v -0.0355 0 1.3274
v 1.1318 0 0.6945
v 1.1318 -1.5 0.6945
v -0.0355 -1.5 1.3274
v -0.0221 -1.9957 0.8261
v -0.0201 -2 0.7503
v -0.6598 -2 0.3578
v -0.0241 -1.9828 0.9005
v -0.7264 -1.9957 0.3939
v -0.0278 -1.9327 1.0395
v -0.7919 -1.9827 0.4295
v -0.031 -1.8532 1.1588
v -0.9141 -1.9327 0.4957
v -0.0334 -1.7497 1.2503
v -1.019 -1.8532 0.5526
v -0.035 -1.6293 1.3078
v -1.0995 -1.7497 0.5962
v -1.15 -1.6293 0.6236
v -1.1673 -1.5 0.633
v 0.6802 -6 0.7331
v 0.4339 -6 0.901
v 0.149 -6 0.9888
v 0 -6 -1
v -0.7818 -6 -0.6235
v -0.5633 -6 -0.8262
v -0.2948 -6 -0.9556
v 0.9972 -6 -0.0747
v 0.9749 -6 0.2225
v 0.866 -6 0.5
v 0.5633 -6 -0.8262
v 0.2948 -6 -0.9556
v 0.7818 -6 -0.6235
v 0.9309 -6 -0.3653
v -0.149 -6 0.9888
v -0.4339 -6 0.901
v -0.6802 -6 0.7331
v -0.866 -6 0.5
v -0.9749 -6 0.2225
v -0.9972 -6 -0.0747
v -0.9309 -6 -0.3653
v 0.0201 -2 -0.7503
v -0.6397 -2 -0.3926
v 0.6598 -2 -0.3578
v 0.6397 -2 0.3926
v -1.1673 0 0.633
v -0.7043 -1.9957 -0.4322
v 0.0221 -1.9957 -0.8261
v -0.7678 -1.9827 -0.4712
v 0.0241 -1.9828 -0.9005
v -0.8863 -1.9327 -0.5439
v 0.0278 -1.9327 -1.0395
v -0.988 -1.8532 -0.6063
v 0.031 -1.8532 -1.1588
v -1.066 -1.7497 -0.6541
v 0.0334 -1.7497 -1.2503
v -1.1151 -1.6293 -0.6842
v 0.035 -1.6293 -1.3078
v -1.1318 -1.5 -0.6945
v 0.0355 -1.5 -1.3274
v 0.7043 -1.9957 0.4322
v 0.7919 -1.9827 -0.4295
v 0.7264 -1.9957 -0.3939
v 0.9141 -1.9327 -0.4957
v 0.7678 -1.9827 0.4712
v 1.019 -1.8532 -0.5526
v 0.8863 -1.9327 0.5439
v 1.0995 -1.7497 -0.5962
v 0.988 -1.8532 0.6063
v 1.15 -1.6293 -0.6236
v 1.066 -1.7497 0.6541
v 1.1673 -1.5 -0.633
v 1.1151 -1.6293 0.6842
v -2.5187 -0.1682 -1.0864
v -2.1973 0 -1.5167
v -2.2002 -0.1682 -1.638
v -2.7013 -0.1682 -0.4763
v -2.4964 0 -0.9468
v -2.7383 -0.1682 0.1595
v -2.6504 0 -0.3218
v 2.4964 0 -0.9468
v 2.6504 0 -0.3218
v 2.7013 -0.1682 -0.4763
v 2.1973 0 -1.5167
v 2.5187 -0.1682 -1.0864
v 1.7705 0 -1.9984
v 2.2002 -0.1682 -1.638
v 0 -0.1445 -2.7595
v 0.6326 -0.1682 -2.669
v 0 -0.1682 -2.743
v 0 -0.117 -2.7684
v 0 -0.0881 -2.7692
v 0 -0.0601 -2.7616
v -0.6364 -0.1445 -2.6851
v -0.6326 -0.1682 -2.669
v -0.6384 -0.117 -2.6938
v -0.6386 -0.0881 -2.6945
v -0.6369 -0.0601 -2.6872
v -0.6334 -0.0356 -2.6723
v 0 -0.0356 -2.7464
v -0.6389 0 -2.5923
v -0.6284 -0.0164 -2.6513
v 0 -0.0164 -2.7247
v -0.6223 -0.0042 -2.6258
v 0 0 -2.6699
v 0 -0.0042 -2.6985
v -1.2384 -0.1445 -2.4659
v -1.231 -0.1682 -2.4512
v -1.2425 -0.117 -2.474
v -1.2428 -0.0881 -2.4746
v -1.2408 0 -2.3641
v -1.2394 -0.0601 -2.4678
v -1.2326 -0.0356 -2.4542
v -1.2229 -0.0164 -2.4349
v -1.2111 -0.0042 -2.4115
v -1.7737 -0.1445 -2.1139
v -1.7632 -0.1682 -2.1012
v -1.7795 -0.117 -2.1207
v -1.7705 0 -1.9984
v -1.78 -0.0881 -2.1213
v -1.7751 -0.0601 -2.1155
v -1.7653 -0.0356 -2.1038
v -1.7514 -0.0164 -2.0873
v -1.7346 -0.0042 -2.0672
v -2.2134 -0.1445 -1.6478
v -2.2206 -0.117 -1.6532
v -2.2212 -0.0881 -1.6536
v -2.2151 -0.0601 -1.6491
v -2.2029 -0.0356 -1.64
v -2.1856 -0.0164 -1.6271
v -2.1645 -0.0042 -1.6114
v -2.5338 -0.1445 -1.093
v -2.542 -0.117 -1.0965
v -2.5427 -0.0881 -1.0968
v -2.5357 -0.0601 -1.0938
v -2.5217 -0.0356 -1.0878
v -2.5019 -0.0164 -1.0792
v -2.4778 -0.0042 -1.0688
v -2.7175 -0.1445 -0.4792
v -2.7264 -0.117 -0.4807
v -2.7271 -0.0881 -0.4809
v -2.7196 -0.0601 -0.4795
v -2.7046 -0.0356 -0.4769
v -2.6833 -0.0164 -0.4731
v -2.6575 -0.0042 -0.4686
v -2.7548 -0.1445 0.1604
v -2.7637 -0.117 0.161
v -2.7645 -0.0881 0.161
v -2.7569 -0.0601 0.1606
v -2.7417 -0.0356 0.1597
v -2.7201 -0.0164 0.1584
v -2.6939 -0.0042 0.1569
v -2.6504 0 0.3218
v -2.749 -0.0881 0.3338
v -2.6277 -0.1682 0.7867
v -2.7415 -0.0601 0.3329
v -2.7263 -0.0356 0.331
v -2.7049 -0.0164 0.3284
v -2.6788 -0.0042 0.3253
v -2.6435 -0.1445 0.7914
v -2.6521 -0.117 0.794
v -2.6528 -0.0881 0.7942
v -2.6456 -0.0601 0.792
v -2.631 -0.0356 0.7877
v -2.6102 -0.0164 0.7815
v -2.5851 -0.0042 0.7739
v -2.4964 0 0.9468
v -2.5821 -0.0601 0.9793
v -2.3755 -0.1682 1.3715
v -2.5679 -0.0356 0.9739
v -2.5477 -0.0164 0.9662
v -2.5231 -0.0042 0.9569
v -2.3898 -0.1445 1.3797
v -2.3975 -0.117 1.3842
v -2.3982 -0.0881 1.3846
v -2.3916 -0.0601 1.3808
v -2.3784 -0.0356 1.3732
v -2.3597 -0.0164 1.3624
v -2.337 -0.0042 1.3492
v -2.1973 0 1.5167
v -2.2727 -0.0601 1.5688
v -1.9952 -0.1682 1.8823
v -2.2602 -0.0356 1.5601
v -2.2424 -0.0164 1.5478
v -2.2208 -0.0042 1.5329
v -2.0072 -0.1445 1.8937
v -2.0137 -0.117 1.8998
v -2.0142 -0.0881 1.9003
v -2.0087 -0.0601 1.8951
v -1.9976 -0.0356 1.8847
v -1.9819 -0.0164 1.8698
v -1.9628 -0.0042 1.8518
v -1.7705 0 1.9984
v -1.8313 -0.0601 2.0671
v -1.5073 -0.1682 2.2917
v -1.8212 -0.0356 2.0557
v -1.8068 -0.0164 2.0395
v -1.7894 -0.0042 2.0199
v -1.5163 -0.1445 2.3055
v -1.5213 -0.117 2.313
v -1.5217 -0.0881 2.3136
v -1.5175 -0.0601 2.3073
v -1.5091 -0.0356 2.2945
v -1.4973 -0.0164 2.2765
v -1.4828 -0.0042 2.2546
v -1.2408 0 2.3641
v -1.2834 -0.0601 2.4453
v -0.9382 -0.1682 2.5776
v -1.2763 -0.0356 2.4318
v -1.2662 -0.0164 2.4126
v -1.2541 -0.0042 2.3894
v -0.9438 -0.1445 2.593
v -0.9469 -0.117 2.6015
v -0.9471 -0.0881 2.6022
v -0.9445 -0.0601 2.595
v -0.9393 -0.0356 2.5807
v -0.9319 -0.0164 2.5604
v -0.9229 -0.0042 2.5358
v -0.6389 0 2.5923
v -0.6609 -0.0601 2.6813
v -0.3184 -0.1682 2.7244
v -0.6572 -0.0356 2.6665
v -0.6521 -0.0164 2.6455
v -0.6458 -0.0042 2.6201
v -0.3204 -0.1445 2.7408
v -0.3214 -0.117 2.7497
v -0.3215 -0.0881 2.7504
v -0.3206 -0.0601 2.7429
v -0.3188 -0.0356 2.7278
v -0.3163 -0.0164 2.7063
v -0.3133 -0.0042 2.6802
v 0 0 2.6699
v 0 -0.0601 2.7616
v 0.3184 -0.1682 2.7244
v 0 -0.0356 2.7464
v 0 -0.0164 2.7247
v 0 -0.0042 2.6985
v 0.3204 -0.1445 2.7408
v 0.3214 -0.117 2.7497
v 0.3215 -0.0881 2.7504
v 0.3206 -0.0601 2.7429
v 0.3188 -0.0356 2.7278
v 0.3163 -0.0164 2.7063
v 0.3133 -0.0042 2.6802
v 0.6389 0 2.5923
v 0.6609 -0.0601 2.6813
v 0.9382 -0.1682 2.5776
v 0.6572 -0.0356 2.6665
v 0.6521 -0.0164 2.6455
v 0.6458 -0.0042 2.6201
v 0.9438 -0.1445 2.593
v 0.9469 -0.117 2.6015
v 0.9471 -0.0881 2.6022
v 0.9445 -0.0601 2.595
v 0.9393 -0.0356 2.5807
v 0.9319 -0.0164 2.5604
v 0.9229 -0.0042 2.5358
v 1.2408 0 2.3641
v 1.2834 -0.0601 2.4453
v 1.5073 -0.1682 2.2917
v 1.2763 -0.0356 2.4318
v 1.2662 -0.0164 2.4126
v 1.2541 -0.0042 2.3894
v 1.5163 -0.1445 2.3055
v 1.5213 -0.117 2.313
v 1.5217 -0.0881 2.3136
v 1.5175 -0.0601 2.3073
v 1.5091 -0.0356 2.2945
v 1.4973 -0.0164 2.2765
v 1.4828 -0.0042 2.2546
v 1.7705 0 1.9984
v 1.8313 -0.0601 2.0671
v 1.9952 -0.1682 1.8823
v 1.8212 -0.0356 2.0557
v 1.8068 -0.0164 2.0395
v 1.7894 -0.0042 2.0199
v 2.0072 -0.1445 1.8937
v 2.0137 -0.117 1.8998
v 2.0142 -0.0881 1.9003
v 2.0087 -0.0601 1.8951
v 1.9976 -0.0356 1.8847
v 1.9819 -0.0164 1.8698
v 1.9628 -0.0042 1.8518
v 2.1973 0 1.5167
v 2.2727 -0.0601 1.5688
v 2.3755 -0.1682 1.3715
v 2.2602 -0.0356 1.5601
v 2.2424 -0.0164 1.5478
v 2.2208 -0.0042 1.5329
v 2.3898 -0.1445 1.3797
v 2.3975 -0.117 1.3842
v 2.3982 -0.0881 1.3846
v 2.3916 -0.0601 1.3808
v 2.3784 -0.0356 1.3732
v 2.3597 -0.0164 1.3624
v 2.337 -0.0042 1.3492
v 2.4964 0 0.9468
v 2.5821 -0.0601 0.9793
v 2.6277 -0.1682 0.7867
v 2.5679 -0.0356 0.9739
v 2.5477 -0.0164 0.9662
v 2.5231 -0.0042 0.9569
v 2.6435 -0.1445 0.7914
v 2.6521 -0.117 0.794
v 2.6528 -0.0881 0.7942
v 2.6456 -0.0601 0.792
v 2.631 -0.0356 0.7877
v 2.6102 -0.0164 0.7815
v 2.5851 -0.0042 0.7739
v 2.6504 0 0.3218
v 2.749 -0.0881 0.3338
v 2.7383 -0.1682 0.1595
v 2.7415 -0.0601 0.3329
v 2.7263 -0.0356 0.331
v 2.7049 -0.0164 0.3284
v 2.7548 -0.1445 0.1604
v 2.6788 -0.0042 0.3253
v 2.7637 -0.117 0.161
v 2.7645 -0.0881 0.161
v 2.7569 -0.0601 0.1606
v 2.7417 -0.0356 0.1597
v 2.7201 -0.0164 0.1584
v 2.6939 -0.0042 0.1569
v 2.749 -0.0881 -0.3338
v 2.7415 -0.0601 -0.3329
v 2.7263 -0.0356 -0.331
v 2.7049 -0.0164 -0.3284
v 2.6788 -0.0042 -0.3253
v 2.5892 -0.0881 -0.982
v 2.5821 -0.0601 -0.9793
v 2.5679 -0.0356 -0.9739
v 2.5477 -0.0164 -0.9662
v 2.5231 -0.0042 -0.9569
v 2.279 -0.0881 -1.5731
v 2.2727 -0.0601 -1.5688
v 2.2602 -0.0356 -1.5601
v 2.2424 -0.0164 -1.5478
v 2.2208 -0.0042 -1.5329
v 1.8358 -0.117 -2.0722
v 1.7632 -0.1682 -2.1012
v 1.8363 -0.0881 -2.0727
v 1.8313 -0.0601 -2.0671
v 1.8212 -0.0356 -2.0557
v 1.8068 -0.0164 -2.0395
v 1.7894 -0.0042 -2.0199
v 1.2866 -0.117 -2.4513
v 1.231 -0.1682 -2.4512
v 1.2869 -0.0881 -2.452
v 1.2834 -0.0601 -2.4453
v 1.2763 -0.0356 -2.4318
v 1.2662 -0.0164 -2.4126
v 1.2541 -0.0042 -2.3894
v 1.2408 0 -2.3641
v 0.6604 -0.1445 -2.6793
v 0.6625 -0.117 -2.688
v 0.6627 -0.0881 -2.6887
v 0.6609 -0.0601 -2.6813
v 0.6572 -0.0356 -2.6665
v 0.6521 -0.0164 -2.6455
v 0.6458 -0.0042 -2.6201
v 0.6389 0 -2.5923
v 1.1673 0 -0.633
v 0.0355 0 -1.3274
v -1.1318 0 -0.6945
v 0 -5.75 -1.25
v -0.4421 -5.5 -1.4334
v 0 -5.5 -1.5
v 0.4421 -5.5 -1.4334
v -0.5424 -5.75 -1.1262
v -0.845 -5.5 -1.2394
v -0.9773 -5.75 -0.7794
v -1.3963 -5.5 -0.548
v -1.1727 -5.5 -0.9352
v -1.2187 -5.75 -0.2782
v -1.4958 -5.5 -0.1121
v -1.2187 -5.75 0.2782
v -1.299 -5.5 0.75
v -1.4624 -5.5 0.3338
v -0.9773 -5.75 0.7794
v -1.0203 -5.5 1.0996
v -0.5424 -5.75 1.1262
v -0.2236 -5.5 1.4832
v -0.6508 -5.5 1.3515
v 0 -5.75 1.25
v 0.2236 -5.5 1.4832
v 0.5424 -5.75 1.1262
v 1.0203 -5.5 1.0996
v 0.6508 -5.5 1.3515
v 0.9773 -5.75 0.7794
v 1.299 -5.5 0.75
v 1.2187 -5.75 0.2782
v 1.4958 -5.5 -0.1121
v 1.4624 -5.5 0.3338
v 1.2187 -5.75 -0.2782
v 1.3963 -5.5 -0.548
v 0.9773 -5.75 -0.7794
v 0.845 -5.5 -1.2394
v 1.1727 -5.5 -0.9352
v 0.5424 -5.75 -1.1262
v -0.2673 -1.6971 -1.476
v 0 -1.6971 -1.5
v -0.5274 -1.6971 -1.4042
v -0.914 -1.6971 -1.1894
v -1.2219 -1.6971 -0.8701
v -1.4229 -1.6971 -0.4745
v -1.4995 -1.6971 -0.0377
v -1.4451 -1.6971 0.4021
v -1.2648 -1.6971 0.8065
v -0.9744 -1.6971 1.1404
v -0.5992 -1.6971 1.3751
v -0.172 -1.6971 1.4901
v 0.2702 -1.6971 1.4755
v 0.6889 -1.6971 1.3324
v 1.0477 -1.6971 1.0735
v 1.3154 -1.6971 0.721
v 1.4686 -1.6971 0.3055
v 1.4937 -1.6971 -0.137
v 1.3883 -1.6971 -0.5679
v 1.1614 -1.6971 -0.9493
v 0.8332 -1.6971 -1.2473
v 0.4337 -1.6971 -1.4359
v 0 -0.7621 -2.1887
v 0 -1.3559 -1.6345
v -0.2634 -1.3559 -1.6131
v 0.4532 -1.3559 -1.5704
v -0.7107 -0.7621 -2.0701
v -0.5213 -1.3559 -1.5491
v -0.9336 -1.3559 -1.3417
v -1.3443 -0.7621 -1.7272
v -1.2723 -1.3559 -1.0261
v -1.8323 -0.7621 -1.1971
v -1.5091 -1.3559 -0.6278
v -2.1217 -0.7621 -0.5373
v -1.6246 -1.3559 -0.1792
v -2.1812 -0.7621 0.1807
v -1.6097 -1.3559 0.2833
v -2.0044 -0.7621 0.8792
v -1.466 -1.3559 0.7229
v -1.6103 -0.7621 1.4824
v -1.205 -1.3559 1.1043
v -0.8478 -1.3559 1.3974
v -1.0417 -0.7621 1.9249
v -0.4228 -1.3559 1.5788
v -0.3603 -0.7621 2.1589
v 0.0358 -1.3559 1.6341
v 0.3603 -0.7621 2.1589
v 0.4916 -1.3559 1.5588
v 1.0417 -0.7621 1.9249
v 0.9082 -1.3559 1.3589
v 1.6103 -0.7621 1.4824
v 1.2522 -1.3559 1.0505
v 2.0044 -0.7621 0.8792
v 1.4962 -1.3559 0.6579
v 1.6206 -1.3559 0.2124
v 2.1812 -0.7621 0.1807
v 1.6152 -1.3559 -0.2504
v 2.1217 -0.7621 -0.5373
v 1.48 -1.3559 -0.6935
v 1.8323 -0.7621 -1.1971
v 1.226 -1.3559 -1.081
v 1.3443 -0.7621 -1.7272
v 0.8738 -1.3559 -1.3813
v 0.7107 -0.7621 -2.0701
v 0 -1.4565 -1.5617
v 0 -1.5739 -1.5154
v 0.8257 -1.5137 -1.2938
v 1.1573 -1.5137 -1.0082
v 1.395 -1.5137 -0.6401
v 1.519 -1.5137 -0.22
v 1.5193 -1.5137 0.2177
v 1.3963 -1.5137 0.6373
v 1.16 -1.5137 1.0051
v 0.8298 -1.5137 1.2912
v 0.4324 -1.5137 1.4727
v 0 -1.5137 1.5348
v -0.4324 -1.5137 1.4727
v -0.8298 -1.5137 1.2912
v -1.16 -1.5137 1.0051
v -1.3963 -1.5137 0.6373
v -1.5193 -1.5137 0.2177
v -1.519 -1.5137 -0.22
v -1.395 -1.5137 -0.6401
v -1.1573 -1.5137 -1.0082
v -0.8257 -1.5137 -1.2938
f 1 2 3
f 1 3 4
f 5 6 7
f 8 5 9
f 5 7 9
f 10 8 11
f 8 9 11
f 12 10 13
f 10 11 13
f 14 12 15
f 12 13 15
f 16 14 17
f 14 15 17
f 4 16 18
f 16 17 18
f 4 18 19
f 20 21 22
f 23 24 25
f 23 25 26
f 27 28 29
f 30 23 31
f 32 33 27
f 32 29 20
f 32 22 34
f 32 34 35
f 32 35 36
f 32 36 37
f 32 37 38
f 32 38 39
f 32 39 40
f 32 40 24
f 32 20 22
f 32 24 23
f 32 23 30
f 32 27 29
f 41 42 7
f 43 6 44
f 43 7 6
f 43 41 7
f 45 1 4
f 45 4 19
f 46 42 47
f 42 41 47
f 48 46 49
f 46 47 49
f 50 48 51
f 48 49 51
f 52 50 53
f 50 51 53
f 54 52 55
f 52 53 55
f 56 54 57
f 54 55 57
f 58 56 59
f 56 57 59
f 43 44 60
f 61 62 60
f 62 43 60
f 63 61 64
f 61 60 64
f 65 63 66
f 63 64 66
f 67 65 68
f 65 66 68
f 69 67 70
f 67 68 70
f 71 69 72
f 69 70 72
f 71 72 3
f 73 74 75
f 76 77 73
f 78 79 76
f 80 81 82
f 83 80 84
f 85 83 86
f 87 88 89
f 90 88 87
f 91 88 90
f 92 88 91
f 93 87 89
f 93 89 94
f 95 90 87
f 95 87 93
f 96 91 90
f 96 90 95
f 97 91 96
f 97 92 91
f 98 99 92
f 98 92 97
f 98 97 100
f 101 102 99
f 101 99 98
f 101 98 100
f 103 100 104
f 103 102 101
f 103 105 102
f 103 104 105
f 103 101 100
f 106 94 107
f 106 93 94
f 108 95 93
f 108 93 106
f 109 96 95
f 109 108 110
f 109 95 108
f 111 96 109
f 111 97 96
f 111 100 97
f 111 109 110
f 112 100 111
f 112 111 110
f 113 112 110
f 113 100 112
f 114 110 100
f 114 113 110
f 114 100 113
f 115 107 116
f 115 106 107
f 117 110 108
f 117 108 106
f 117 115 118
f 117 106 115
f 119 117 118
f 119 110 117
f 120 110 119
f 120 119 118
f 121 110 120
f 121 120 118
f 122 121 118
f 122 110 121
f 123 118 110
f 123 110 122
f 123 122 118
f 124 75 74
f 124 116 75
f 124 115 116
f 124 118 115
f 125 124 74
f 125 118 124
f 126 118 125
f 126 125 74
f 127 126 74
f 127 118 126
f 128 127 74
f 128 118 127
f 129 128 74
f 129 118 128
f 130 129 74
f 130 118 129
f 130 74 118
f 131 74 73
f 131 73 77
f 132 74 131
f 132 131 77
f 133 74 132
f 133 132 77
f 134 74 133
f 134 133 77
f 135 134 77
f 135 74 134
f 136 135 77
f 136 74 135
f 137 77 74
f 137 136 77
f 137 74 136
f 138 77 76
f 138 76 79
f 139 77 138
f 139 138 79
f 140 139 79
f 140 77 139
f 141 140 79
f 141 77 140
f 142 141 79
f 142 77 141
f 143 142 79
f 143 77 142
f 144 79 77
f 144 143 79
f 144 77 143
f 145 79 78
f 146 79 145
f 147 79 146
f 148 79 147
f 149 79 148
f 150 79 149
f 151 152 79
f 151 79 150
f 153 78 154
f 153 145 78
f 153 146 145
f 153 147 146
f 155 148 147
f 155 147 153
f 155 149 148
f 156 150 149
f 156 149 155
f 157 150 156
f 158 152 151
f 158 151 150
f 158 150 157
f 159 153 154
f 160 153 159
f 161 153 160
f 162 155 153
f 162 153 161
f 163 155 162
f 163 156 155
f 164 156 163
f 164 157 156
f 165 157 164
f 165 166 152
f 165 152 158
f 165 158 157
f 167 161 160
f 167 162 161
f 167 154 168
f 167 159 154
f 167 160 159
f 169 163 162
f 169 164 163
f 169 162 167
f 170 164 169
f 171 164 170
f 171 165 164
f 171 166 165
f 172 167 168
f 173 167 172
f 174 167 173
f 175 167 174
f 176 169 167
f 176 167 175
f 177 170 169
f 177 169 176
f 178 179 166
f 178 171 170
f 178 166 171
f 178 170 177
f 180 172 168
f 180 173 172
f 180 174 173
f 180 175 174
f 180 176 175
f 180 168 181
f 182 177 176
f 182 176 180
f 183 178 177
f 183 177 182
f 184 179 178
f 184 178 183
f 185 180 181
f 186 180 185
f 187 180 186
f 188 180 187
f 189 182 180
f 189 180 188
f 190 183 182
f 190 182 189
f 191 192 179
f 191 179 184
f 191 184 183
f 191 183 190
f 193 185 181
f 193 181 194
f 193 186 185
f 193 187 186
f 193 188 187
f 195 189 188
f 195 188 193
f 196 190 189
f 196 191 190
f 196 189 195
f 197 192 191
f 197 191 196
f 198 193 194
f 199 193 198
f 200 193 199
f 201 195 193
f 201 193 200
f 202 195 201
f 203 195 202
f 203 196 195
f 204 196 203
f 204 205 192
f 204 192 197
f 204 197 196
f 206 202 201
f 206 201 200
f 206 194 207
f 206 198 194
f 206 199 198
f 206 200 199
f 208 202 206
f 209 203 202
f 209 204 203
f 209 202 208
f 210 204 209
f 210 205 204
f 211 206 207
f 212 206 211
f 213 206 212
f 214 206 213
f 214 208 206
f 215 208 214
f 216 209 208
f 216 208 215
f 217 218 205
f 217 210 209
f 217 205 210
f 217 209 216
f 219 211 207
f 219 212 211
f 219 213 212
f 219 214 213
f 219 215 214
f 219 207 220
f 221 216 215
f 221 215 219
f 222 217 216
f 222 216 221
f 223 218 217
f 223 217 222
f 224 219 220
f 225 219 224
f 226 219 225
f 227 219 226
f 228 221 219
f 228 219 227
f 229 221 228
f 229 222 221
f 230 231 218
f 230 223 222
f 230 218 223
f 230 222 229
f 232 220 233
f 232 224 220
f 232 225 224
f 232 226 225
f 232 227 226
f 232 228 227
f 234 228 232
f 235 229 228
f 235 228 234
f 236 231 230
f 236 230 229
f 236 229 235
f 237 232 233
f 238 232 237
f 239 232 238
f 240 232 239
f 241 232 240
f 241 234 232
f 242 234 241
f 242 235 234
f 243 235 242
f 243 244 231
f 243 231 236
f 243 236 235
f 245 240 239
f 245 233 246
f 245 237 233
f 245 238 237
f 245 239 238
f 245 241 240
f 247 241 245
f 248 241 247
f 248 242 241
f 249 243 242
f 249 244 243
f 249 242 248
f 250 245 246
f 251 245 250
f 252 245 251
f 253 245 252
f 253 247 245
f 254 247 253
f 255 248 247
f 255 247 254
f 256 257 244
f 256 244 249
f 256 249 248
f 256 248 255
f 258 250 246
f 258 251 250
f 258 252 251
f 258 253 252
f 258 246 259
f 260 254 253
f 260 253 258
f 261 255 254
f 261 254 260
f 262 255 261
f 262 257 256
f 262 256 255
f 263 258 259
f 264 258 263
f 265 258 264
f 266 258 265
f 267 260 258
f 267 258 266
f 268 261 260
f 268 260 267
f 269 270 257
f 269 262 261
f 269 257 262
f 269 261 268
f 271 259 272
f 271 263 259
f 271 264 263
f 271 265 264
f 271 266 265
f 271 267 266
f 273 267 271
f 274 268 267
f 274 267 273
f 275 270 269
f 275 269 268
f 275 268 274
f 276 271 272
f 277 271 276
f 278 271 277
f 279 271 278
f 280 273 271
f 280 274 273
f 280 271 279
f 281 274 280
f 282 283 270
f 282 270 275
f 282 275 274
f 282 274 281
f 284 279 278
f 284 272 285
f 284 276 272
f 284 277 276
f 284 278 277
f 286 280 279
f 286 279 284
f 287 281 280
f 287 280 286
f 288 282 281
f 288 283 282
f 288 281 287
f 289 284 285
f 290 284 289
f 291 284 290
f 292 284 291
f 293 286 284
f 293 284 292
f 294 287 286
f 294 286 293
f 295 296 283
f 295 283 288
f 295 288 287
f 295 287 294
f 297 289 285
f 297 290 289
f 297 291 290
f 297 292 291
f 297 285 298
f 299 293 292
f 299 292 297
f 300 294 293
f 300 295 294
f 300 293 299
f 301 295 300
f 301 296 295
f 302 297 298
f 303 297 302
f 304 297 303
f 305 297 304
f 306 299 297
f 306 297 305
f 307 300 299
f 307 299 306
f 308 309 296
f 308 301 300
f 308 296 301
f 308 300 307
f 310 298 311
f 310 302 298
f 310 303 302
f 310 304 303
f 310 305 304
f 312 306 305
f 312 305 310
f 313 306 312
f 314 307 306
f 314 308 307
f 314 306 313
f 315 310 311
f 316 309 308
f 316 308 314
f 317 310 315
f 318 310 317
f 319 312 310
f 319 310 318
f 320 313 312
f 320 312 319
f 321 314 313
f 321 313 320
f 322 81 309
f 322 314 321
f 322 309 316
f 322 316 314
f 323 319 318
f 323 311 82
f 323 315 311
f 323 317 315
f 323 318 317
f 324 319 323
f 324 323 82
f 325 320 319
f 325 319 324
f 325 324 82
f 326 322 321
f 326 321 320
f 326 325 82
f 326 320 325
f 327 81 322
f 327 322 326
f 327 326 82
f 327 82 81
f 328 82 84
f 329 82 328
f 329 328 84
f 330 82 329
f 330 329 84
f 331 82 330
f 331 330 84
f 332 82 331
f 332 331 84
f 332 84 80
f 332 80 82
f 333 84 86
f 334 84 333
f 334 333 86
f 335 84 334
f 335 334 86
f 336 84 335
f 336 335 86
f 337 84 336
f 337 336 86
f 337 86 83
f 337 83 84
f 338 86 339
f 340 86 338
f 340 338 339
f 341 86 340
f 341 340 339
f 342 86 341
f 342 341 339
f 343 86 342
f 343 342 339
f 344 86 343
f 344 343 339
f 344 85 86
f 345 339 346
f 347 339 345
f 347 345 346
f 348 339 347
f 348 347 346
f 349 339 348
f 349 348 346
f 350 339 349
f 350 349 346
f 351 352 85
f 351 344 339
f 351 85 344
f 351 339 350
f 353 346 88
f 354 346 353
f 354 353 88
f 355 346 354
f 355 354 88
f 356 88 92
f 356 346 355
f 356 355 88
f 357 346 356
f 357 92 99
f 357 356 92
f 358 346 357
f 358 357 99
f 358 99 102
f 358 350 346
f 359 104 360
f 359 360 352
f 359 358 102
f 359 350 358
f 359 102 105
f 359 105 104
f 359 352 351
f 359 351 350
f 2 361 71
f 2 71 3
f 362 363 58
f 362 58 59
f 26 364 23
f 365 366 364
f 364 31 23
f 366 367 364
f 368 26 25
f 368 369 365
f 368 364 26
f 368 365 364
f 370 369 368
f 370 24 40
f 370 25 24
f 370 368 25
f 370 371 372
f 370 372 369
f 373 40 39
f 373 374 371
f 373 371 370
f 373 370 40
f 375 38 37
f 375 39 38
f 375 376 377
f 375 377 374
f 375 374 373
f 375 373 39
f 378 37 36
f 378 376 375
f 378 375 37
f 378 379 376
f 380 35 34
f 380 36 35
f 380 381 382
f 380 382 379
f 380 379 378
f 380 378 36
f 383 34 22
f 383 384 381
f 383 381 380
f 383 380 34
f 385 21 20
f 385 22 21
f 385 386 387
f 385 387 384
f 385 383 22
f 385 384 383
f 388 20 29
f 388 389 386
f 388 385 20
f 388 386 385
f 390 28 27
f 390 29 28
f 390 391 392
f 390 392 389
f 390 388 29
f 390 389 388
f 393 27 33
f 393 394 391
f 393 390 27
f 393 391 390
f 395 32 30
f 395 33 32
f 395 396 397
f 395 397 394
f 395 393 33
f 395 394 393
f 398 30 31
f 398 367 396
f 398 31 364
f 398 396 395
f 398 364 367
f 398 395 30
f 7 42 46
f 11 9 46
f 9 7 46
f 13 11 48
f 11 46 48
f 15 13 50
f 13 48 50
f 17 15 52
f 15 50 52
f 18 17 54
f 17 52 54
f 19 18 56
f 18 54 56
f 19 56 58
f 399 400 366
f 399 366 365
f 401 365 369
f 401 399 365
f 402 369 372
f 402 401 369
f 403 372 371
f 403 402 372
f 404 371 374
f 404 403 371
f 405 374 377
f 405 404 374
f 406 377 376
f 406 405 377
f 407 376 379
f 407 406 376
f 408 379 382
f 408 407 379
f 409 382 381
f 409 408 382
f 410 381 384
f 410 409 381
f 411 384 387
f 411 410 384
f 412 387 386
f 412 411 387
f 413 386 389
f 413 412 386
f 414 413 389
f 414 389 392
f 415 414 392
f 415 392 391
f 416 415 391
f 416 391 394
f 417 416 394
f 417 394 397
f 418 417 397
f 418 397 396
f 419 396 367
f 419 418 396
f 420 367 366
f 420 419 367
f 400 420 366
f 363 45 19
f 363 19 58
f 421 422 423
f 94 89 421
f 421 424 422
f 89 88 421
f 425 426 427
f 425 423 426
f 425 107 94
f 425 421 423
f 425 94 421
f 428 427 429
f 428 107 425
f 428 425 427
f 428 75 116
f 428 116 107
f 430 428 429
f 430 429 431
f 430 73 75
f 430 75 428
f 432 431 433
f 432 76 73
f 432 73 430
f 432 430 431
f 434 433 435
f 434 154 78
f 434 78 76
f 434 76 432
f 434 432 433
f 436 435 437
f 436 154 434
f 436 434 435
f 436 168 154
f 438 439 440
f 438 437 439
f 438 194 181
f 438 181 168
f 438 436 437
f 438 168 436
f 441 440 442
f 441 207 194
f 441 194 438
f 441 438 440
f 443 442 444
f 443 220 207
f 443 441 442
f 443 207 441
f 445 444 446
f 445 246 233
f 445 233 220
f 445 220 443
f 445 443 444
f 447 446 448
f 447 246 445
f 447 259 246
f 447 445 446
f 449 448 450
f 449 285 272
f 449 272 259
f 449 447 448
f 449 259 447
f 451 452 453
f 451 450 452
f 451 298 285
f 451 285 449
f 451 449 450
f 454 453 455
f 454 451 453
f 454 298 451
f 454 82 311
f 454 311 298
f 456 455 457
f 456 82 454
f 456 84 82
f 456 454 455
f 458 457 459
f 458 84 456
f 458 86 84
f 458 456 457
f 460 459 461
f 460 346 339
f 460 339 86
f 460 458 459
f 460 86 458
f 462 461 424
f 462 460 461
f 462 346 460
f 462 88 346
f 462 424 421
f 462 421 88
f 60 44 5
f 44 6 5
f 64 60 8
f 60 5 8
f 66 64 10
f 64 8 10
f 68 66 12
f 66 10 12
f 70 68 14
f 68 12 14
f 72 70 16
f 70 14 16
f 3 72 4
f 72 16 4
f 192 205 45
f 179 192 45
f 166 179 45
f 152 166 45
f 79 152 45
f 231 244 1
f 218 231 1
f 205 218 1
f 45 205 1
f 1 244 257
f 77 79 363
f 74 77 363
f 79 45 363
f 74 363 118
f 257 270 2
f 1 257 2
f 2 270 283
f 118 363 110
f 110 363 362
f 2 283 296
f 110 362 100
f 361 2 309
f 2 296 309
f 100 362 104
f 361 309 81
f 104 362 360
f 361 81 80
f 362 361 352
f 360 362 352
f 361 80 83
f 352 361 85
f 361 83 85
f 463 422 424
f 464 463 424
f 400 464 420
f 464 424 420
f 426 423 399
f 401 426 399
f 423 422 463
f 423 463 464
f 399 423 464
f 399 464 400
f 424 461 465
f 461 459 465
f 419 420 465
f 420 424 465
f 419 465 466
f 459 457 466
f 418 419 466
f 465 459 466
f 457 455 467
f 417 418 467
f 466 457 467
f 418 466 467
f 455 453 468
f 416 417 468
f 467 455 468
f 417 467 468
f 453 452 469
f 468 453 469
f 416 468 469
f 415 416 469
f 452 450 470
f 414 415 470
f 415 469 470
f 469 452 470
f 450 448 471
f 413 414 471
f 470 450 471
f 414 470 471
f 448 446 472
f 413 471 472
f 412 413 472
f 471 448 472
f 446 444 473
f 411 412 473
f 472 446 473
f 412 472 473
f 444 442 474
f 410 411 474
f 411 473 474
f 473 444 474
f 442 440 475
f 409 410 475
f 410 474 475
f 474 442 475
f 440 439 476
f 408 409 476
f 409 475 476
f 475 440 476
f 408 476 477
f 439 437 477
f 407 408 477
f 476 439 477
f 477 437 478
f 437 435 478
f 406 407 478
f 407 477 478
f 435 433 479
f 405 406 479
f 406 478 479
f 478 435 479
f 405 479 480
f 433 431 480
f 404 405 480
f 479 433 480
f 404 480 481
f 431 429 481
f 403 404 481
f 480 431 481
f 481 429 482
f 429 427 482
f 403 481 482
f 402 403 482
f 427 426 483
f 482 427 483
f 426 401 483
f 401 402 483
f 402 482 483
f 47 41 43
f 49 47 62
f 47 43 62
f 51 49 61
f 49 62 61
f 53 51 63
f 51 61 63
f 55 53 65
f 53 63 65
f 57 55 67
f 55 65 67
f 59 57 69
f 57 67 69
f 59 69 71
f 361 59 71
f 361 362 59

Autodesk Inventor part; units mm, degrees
ref_plane "YZ Plane" through (0, 0, 0) normal (1, 0, 0) x (0, 1, 0)
ref_plane "XZ Plane" through (0, 0, 0) normal (0, 1, 0) x (-1, 0, 0)
ref_plane "XY Plane" through (0, 0, 0) normal (0, 0, 1) x (1, 0, 0)
sketch "Szkic2" plane through (0, 0, 0) normal (1, 0, 0) x (0, 1, 0)
  line L0 (0, -2.9) -> (0, 2.9)
  line L1 (-1.5, -1.5) -> (-1.5, 1.5)
  line L2 (-1.5, -1.5) -> (0, -2.9)
  line L3 (-1.5, 1.5) -> (0, 2.9)
  line L4 (0, 0) -> (-6, 0)
  line L5 (-6, 0) -> (-6, -1.5)
  line L6 (-6, -1.5) -> (-1.5, -1.5)
  dimension "d0" = 5.8
  dimension "d2" = 3
  dimension "d3" = 1.5
  dimension "d4" = 6
  dimension "d5" = 1.5
revolve "Obrót1" add sketch "Szkic2" angle 360 about axis through (0, 0, 0) along (0, -1, 0) contours L2 L1 L4 L0 | L6 L5 L4 L1
sketch "Szkic3" plane through (0, 0, 0) normal (0, 1, 0) x (1, 0, 0)
  line L0 (-1.1673, -0.633) -> (-1.1318, 0.6945)
  line L1 (-1.1318, 0.6945) -> (0.0355, 1.3274)
  line L2 (0.0355, 1.3274) -> (1.1673, 0.633)
  line L3 (1.1673, 0.633) -> (1.1318, -0.6945)
  line L4 (1.1318, -0.6945) -> (-0.0355, -1.3274)
  line L5 (-0.0355, -1.3274) -> (-1.1673, -0.633)
  point P0 (0, 0)
  point P1 (0, 0)
  dimension "d7" = 2.3
extrude "Wyciągnięcie proste1" cut sketch "Szkic3" against normal blind 2
fillet "Zaokrąglenie1" radius 0.5 6 edges at (-1.1496, -2, -0.0308) (-0.6014, -2, 0.9802) (-0.5482, -2, -1.011) (0.6014, -2, -0.9802) (0.5482, -2, 1.011) (1.1496, -2, 0.0308)
fillet "Zaokrąglenie2" radius 0.5 1 edges at (0, -1.5, 1.5)
fillet "Zaokrąglenie3" radius 0.1 1 edges at (0, 0, 2.9)
thread "Gwint1" size "M3x0.5" class "6g" standard "ANSI Metric M Profile" full length
chamfer "Faza1" distance 0.5 angle 45 1 edges at (0, -6, 1.5)
properties part number "Screw M3 6mm flat head"
